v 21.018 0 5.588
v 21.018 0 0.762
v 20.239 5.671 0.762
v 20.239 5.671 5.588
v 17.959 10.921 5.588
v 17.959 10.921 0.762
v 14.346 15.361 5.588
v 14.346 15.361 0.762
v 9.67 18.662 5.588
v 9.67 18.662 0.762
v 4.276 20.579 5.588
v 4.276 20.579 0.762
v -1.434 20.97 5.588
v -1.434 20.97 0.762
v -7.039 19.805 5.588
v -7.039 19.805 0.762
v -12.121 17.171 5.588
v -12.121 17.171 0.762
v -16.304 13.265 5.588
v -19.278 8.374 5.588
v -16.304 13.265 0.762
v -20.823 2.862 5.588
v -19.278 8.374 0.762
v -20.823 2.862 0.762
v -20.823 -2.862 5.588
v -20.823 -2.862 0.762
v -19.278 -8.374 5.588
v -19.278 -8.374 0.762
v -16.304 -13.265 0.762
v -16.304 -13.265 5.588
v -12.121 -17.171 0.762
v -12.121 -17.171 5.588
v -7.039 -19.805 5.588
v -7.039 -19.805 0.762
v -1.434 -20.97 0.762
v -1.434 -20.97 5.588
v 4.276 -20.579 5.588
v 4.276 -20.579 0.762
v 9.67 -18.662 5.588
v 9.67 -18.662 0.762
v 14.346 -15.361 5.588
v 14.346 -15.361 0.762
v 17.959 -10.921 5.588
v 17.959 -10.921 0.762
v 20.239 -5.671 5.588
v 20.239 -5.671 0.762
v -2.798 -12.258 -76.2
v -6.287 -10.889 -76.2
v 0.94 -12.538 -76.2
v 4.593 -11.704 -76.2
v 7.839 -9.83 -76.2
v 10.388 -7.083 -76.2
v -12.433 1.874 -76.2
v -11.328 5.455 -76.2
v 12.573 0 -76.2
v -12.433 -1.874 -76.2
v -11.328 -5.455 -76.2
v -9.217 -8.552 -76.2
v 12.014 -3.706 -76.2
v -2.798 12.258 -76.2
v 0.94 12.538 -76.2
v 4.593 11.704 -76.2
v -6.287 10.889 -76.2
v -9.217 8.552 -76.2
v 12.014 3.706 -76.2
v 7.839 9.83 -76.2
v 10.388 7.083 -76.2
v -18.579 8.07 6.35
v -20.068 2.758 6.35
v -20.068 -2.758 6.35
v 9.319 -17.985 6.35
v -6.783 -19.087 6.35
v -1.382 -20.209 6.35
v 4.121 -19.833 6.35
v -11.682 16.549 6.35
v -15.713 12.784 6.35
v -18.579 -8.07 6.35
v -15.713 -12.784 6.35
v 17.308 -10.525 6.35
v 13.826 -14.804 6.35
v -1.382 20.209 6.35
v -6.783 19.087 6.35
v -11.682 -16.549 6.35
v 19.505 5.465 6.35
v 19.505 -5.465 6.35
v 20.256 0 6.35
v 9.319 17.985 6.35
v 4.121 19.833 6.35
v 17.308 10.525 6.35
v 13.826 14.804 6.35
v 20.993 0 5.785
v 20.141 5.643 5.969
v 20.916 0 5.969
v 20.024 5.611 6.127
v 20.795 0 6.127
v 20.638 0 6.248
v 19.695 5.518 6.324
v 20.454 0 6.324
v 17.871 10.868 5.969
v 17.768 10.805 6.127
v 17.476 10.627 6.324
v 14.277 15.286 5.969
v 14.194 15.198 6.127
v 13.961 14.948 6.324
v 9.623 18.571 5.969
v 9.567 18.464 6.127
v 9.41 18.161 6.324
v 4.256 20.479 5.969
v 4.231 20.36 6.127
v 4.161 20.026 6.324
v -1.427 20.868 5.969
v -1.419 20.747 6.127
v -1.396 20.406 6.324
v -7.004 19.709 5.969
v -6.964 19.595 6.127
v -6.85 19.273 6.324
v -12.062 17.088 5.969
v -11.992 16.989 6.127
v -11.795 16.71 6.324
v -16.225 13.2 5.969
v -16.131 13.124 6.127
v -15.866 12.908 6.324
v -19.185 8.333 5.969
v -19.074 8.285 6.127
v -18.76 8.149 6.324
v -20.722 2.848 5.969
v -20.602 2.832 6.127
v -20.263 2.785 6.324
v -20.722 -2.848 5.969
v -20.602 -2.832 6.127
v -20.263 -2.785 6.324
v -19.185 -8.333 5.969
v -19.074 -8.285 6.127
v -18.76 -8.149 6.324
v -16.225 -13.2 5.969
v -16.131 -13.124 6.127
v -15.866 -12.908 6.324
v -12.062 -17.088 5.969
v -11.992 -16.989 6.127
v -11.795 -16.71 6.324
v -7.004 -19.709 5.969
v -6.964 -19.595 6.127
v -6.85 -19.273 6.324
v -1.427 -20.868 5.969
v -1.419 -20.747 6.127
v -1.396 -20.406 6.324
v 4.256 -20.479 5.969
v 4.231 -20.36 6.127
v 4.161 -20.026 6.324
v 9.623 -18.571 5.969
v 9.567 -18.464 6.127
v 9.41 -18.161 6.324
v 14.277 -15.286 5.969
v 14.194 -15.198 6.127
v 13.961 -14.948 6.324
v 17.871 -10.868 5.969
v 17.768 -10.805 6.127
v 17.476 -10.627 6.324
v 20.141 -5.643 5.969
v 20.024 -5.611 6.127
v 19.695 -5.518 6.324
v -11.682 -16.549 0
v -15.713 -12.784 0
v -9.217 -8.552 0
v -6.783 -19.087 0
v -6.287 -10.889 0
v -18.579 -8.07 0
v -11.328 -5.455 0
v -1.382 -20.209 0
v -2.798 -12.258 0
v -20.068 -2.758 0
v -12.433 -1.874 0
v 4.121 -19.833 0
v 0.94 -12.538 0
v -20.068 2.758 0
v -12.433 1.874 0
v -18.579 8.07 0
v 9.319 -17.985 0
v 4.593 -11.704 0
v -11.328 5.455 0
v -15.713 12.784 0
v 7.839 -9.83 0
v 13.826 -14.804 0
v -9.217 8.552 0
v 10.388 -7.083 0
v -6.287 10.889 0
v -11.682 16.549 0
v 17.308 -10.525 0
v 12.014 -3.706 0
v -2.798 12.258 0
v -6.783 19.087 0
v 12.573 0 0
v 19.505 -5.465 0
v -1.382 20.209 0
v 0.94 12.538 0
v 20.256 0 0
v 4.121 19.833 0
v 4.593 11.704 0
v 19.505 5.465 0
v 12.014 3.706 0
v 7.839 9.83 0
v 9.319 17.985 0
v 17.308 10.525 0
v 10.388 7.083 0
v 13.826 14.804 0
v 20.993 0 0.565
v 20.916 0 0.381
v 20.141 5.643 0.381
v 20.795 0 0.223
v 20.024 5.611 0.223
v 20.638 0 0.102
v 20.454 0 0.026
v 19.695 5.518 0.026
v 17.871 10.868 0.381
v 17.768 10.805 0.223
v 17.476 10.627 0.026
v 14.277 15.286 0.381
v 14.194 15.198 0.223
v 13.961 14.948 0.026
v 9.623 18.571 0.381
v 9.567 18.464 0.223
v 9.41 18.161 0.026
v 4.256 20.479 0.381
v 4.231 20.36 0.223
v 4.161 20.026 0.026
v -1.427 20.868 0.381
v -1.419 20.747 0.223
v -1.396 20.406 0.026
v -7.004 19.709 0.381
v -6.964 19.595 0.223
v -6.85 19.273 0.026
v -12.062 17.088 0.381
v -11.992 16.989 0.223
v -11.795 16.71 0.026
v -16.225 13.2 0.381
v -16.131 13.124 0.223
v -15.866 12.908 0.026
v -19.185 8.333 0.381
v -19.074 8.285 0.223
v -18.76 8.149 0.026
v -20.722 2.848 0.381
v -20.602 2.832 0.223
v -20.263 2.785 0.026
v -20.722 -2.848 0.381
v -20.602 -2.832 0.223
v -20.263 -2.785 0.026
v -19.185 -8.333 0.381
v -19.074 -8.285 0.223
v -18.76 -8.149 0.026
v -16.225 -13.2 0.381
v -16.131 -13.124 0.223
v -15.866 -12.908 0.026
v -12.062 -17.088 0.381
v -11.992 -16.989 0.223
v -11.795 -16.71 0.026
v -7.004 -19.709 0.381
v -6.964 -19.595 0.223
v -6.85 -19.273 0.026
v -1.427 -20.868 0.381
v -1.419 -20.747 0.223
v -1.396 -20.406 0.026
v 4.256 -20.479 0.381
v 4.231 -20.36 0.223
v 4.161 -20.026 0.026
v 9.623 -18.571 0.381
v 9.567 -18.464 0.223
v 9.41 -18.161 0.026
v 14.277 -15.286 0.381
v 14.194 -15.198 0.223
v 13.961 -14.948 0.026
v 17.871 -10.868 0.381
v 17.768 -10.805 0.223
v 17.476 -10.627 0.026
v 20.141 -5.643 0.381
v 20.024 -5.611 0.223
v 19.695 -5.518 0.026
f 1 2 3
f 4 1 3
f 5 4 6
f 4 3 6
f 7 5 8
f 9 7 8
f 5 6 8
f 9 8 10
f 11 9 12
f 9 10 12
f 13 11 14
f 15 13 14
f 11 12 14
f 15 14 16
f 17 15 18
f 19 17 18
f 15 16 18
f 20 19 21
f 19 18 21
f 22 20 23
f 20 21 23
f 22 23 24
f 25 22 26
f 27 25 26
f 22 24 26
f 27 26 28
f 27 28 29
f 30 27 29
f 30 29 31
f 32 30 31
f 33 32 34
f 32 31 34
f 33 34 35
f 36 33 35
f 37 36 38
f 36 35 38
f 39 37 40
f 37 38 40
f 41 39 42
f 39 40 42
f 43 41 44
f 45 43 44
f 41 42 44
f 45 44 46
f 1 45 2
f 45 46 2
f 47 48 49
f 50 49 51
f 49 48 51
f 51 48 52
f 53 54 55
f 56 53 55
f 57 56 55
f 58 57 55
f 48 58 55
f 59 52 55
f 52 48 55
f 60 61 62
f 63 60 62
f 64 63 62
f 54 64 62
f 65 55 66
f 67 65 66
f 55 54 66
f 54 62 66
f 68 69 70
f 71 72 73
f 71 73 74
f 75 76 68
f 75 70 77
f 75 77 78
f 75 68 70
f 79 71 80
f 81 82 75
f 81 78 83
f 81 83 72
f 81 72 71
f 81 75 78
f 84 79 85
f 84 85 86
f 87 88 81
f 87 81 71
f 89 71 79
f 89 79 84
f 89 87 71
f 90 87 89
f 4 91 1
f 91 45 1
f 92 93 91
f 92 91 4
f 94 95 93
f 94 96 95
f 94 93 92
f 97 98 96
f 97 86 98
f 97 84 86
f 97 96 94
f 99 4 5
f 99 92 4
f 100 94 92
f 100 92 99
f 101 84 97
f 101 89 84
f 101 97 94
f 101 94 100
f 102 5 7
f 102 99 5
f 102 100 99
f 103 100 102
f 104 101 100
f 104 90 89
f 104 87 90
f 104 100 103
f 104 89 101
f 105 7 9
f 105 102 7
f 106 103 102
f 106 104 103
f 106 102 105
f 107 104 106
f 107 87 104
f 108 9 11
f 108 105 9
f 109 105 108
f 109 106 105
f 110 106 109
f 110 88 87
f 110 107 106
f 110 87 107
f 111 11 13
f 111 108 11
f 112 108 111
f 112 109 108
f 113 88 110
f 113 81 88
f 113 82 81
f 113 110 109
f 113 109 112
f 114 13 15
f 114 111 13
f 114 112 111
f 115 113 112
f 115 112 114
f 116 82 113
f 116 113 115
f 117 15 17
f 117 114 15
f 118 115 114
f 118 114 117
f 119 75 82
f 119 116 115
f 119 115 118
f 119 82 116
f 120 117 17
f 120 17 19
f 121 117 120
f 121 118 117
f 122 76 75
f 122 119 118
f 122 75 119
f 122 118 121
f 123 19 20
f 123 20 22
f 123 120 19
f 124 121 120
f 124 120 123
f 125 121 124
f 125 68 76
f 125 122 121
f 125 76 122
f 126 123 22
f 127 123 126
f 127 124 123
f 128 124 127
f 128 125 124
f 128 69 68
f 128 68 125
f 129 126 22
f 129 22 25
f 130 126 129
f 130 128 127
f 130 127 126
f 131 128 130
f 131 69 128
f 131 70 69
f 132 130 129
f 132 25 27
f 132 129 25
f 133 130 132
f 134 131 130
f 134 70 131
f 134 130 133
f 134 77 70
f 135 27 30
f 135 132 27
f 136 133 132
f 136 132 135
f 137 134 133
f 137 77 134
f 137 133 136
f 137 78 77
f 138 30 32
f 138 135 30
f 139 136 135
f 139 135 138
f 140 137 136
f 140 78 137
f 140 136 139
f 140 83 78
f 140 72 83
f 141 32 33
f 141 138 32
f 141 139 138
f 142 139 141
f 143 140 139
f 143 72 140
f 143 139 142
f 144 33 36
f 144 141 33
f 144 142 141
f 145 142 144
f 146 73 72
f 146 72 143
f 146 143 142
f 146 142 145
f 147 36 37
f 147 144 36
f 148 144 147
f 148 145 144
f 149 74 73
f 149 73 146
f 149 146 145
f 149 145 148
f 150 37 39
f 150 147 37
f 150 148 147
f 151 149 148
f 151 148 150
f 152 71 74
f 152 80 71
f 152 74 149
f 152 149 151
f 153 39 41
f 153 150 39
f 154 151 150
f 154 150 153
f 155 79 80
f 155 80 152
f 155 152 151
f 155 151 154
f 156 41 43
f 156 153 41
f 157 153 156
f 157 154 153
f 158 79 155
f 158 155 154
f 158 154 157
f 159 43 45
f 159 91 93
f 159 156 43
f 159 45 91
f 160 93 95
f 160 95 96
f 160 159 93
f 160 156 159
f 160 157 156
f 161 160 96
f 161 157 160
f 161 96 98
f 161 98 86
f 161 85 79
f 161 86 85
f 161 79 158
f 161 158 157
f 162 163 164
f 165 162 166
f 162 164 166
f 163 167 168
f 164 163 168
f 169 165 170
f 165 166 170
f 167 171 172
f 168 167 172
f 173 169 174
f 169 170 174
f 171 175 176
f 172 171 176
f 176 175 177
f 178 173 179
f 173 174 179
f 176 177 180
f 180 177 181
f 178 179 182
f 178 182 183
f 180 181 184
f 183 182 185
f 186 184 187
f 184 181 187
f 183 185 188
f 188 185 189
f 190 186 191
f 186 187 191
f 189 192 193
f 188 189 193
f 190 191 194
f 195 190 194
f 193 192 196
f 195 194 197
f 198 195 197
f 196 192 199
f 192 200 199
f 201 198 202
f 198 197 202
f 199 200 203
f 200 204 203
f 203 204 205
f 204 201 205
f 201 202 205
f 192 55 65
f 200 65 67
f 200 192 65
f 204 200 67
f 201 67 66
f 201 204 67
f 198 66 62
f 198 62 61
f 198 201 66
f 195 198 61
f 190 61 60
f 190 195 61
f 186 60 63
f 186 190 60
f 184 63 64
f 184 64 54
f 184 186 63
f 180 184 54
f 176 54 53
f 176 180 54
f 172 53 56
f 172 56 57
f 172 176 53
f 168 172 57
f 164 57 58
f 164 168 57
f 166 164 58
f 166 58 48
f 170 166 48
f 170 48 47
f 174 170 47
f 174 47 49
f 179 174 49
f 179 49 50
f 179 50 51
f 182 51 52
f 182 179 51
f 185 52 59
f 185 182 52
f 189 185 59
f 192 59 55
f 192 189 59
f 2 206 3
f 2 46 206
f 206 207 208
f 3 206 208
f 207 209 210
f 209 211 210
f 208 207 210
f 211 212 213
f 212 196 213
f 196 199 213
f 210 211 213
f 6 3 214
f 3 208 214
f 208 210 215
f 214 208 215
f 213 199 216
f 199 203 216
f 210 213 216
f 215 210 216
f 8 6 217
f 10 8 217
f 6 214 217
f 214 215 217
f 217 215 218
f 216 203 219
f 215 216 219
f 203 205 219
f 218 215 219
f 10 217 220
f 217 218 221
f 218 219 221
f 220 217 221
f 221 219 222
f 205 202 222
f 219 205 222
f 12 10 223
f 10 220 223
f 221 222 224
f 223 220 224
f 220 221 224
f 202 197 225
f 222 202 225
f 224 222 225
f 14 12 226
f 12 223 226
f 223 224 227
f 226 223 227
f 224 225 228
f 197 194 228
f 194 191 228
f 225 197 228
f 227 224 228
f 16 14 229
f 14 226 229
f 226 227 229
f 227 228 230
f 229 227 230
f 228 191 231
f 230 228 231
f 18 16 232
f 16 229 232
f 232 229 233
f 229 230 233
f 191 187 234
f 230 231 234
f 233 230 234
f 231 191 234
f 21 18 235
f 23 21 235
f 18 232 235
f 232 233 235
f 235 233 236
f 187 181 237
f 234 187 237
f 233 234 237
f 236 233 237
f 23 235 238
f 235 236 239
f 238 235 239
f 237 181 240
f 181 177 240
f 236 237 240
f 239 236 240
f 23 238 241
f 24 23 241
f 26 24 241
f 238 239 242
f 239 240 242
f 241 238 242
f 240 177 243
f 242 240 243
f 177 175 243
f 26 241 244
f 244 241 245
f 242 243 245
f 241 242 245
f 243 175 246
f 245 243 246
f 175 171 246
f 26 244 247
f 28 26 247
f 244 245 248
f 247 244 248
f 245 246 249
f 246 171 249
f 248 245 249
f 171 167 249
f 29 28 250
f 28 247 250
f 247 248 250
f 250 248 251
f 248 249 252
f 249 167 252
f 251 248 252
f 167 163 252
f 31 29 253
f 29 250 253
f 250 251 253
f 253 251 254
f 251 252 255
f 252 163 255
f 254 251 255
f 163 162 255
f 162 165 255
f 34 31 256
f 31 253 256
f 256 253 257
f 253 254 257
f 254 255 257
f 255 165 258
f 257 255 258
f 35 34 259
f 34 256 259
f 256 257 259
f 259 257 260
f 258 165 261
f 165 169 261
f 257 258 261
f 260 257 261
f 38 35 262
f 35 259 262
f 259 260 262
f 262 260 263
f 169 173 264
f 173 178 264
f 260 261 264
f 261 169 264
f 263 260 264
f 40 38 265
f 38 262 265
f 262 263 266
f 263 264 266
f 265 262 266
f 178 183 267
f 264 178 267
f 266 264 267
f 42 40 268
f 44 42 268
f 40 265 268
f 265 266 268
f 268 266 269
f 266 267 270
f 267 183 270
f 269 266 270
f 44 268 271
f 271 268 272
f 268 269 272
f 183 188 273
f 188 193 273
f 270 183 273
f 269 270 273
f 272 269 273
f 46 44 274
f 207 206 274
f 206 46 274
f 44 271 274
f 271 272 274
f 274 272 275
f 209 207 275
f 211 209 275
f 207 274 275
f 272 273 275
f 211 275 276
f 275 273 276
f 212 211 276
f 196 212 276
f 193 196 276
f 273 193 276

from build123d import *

# Parameters (mm, degrees)
SKETCH1_R           = 12.573
BOSS_EXTRUDE1_DEPTH = 76.2
SKETCH2_R           = 21.0185
BOSS_EXTRUDE2_DEPTH = 6.35
FILLET1_R           = 0.762


with BuildPart() as part:
    # Sketch1 → Boss-Extrude1 (new body)
    with BuildSketch(Plane.XY):
        Circle(SKETCH1_R)
    extrude(amount=-BOSS_EXTRUDE1_DEPTH)

    # Sketch2 → Boss-Extrude2 (add)
    with BuildSketch(Plane.XY):
        Circle(SKETCH2_R)
    extrude(amount=BOSS_EXTRUDE2_DEPTH)

    # Fillet1
    fillet1_edges = [part.edges().sort_by_distance(p)[0] for p in [
        (-21.0185, 0, 0),
        (-21.0185, 0, 6.35),
    ]]
    fillet(fillet1_edges, radius=FILLET1_R)


solid = part.part
